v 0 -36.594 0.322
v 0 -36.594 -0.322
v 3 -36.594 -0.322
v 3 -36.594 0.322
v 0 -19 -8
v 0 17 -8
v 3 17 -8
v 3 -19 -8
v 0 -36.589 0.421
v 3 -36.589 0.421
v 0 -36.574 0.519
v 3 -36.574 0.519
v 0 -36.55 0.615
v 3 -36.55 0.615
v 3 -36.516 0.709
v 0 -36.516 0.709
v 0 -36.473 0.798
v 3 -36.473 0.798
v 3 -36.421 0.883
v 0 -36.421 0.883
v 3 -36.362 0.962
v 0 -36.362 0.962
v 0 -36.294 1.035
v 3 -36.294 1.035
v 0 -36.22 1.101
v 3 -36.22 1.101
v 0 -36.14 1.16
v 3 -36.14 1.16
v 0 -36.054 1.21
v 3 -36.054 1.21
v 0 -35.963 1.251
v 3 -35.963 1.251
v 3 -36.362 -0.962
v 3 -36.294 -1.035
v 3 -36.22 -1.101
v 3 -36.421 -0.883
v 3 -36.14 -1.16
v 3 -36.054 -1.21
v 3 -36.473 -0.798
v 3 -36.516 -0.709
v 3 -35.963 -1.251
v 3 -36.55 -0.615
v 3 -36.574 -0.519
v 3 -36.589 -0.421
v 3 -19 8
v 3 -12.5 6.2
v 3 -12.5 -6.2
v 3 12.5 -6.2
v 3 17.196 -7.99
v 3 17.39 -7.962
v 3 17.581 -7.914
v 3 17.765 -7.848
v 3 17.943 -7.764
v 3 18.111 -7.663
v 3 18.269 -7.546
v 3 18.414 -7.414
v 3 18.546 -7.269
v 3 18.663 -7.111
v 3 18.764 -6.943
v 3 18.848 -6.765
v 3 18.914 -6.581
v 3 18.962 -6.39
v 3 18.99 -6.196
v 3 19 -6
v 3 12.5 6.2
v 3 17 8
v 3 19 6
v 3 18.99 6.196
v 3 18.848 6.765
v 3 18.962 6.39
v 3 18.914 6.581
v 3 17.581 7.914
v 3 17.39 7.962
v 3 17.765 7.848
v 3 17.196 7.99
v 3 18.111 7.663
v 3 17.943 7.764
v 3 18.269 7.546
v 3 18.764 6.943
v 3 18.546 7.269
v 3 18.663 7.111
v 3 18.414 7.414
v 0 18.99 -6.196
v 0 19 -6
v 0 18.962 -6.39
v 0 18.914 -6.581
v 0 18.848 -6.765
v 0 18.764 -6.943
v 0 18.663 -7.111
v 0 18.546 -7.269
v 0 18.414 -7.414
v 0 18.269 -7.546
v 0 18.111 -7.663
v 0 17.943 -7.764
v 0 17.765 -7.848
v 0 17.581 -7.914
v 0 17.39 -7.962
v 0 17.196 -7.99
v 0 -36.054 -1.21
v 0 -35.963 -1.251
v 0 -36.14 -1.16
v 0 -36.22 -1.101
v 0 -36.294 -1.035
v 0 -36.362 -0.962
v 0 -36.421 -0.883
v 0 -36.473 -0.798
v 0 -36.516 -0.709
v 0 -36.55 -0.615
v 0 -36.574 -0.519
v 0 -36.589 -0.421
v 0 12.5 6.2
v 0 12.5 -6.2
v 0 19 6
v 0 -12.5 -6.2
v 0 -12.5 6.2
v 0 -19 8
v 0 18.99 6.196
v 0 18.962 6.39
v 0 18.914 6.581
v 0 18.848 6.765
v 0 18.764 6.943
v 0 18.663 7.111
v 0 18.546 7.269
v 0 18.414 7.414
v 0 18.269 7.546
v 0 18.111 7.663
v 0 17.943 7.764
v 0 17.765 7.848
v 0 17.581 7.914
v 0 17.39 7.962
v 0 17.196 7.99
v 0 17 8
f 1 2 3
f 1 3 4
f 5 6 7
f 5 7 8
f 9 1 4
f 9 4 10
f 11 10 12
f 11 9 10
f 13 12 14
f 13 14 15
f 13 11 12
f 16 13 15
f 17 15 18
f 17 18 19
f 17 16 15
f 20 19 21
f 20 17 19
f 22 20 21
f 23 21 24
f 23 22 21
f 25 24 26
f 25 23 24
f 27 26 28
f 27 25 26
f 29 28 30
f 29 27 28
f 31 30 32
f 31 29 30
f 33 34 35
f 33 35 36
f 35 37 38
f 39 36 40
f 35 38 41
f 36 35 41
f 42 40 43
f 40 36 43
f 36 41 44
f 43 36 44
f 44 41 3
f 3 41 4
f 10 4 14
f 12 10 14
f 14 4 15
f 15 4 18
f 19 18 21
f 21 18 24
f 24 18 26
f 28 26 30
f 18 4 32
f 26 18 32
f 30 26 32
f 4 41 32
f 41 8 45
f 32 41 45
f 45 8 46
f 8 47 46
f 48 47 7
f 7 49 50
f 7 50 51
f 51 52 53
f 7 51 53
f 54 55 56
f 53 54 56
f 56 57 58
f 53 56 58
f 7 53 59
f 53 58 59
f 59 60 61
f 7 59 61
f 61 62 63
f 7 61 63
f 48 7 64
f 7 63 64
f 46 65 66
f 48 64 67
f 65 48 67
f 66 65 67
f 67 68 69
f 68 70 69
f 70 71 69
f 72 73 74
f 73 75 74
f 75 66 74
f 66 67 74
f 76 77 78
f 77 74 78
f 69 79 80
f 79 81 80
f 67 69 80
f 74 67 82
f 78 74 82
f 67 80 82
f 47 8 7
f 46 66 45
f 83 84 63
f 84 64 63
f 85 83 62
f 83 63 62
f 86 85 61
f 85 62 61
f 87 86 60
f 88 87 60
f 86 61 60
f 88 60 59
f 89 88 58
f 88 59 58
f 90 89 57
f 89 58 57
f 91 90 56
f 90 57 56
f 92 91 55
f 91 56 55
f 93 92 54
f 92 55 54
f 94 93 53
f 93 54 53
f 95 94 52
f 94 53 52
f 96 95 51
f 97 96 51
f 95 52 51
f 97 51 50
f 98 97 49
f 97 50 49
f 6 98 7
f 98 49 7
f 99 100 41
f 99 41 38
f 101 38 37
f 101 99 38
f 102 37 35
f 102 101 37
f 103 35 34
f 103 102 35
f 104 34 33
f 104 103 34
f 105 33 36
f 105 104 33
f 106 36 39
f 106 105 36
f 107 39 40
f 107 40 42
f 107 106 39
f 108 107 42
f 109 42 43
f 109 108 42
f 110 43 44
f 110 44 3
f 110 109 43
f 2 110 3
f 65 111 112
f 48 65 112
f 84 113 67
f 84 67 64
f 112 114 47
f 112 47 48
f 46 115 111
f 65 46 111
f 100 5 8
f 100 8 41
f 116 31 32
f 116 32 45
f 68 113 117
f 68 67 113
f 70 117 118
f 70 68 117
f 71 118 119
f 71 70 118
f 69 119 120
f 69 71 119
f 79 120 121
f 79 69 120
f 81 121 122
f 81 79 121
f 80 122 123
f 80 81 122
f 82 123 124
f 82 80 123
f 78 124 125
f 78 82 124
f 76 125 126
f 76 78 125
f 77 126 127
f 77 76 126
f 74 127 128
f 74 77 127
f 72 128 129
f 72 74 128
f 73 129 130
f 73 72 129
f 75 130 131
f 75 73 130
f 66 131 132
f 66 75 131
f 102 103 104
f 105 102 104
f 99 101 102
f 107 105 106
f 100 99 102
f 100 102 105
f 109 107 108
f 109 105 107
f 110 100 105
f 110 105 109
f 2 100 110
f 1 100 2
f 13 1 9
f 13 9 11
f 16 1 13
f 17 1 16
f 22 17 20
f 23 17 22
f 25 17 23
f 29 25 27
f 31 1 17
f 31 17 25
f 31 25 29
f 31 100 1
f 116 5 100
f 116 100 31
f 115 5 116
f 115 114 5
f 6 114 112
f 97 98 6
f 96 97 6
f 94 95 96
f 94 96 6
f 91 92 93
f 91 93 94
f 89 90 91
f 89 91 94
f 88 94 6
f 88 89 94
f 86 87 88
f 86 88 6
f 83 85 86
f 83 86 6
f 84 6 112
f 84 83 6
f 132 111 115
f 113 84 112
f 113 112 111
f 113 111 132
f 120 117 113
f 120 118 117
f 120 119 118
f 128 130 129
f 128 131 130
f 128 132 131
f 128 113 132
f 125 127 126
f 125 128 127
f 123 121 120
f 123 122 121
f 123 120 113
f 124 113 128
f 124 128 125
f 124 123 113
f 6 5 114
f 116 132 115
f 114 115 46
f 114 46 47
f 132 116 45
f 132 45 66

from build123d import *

# Parameters (mm, degrees)
ESBO_O1_W                = 12.4
ESBO_O1_H                = 25
RESSALTO_EXTRUS_O1_DEPTH = 3
FILETE1_R                = 2


with BuildPart() as part:
    # Esboço1 → Ressalto-extrusão1 (new body)
    with BuildSketch(Plane(origin=(0, 0, 0), x_dir=(0, 0, -1), z_dir=(1, 0, 0))):
        with BuildLine():
            Line((-8, 19), (8, 19))
            Line((8, 19), (8, -19))
            Line((8, -19), (1.25078293, -35.963499669))
            ThreePointArc((1.25078293, -35.963499669), (0.883014852, -36.421369201), (0.321624406, -36.593818135))
            Line((0.321624406, -36.593818135), (-0.321624406, -36.593818135))
            ThreePointArc((-0.321624406, -36.593818135), (-0.883014852, -36.421369201), (-1.25078293, -35.963499669))
            Line((-1.25078293, -35.963499669), (-8, -19))
            Line((-8, -19), (-8, 19))
        make_face()
        Rectangle(ESBO_O1_W, ESBO_O1_H, mode=Mode.SUBTRACT)
    extrude(amount=RESSALTO_EXTRUS_O1_DEPTH)

    # Filete1
    filete1_edges = [part.edges().sort_by_distance(p)[0] for p in [
        (1.5, 19, 8),
        (1.5, 19, -8),
    ]]
    fillet(filete1_edges, radius=FILETE1_R)


solid = part.part
